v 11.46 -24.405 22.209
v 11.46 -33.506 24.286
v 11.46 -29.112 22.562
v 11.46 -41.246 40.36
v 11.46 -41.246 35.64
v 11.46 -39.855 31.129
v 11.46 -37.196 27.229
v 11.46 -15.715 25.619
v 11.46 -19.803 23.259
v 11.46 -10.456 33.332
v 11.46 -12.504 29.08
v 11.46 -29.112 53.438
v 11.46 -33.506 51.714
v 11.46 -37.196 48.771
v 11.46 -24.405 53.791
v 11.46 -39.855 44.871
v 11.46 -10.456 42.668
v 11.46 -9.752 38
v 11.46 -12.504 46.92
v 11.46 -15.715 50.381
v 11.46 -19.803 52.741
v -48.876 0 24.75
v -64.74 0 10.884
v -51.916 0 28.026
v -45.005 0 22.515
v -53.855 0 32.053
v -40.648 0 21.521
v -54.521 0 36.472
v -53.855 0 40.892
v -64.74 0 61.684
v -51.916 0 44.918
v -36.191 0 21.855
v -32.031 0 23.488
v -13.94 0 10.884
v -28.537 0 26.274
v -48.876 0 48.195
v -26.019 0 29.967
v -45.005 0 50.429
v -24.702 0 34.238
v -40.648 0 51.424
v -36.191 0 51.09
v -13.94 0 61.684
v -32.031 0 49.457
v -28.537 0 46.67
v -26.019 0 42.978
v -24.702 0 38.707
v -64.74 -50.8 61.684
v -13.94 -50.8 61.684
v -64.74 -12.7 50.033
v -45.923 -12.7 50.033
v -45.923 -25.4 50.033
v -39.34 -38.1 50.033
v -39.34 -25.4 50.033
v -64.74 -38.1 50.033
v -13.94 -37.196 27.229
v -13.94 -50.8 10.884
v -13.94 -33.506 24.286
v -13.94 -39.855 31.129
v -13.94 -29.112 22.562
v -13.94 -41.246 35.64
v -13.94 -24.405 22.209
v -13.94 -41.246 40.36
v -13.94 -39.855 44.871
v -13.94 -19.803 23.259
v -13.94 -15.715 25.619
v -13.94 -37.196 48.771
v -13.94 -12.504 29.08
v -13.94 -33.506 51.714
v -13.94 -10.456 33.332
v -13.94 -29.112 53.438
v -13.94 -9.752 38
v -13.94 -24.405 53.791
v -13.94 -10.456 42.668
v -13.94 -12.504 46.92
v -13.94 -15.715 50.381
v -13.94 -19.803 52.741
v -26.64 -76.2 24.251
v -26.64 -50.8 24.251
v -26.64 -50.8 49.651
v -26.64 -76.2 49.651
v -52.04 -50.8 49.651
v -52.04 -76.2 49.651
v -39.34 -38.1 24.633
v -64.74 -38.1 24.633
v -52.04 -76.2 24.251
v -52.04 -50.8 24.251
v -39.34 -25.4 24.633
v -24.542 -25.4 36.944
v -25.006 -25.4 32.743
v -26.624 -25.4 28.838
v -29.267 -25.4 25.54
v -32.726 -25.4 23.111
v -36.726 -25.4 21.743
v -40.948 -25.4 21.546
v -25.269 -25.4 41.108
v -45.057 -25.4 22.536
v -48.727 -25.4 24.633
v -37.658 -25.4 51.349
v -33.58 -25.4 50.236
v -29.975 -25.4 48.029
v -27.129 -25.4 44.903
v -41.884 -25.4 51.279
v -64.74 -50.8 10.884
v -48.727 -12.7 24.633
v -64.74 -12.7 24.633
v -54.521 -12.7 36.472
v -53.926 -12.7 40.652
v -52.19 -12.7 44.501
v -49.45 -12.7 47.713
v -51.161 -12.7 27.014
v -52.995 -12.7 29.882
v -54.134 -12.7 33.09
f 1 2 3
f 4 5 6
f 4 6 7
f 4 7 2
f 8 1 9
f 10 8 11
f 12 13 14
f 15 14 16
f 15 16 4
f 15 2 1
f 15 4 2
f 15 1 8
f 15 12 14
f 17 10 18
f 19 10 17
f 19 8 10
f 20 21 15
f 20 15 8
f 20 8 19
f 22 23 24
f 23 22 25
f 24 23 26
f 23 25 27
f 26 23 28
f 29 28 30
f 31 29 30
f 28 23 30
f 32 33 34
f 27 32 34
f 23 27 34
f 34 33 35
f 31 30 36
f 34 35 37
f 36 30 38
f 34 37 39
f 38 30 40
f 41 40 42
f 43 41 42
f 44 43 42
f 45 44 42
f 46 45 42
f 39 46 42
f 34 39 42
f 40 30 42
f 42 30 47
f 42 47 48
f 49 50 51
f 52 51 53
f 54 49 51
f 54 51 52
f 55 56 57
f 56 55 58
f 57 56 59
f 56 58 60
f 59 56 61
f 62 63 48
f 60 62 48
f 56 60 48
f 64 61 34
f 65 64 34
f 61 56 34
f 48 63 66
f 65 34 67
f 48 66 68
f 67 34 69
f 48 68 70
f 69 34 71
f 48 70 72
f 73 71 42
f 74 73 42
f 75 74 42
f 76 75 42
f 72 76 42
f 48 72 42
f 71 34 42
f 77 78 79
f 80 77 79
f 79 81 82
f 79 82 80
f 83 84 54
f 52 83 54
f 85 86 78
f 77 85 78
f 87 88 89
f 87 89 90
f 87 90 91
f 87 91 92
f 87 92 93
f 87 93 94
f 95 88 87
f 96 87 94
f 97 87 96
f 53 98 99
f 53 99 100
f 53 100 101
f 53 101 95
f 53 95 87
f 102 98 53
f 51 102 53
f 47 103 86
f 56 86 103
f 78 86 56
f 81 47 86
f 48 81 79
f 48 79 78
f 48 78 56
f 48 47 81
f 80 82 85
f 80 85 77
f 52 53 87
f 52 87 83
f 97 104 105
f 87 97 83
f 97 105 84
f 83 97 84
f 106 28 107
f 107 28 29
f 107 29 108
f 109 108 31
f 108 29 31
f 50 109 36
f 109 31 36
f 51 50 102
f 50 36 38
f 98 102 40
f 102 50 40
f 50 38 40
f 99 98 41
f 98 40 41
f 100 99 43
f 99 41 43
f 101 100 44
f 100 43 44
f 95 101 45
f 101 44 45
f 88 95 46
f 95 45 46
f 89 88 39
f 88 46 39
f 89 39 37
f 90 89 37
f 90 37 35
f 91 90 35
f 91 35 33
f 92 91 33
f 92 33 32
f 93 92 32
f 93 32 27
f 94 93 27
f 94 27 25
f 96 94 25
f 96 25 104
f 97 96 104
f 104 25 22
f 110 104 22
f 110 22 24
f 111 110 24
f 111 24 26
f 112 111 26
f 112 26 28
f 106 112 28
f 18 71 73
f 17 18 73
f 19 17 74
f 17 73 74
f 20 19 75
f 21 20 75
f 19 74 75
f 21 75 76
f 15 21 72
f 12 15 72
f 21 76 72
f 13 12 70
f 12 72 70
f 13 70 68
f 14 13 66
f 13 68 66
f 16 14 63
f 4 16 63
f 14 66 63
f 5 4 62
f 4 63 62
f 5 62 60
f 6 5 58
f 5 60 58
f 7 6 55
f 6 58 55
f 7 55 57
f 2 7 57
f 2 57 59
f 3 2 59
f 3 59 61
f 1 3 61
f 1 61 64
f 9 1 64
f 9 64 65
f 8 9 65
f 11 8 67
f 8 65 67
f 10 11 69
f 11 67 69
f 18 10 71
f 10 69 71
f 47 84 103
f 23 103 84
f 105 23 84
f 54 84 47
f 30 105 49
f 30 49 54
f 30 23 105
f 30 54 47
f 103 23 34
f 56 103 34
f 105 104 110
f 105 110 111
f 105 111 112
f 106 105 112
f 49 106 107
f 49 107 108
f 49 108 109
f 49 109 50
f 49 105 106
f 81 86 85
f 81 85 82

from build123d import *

# Parameters (mm, degrees)
F0_W     = 50.8
F0_H     = 50.8
F1_DEPTH = 50.8
F2_W     = 25.4
F2_H     = 25.4
F3_DEPTH = 25.4
F4_W     = 25.4
F4_H     = 25.4
F5_DEPTH = 25.4
F6_R     = 15.835428
F7_DEPTH = 25.4
F8_R     = 14.993286
F9_DEPTH = 25.4


with BuildPart() as f1:
    # F0 (on Front) → F1 (new body)
    with BuildSketch(Plane.XZ):
        with Locations((-39.33969, 36.284415)):
            Rectangle(F0_W, F0_H)
    extrude(amount=F1_DEPTH)

    # F2 (on face) → F3 (join)
    with BuildSketch(Plane.XZ.offset(50.8)):
        with Locations((-39.33969, 36.951241)):
            Rectangle(F2_W, F2_H)
    extrude(amount=F3_DEPTH)

    # F4 (on face) → F5 (cut)
    with BuildSketch(Plane(origin=(-64.73969, 0, 0), x_dir=(0, -1, 0), z_dir=(-1, 0, 0))):
        with Locations((25.4, 37.333151)):
            Rectangle(F4_W, F4_H)
    extrude(amount=-F5_DEPTH, mode=Mode.SUBTRACT)

    # F6 (on face) → F7 (join)
    with BuildSketch(Plane.YZ.offset(-13.93969)):
        with Locations((-25.587924, 37.999976)):
            Circle(F6_R)
    extrude(amount=F7_DEPTH)

    # F8 (on face) → F9 (cut)
    with BuildSketch(Plane(origin=(0, 0, 0), x_dir=(-1, 0, 0), z_dir=(0, 1, 0))):
        with Locations((39.527614, 36.472339)):
            Circle(F8_R)
    extrude(amount=-F9_DEPTH, mode=Mode.SUBTRACT)


solid = f1.part
